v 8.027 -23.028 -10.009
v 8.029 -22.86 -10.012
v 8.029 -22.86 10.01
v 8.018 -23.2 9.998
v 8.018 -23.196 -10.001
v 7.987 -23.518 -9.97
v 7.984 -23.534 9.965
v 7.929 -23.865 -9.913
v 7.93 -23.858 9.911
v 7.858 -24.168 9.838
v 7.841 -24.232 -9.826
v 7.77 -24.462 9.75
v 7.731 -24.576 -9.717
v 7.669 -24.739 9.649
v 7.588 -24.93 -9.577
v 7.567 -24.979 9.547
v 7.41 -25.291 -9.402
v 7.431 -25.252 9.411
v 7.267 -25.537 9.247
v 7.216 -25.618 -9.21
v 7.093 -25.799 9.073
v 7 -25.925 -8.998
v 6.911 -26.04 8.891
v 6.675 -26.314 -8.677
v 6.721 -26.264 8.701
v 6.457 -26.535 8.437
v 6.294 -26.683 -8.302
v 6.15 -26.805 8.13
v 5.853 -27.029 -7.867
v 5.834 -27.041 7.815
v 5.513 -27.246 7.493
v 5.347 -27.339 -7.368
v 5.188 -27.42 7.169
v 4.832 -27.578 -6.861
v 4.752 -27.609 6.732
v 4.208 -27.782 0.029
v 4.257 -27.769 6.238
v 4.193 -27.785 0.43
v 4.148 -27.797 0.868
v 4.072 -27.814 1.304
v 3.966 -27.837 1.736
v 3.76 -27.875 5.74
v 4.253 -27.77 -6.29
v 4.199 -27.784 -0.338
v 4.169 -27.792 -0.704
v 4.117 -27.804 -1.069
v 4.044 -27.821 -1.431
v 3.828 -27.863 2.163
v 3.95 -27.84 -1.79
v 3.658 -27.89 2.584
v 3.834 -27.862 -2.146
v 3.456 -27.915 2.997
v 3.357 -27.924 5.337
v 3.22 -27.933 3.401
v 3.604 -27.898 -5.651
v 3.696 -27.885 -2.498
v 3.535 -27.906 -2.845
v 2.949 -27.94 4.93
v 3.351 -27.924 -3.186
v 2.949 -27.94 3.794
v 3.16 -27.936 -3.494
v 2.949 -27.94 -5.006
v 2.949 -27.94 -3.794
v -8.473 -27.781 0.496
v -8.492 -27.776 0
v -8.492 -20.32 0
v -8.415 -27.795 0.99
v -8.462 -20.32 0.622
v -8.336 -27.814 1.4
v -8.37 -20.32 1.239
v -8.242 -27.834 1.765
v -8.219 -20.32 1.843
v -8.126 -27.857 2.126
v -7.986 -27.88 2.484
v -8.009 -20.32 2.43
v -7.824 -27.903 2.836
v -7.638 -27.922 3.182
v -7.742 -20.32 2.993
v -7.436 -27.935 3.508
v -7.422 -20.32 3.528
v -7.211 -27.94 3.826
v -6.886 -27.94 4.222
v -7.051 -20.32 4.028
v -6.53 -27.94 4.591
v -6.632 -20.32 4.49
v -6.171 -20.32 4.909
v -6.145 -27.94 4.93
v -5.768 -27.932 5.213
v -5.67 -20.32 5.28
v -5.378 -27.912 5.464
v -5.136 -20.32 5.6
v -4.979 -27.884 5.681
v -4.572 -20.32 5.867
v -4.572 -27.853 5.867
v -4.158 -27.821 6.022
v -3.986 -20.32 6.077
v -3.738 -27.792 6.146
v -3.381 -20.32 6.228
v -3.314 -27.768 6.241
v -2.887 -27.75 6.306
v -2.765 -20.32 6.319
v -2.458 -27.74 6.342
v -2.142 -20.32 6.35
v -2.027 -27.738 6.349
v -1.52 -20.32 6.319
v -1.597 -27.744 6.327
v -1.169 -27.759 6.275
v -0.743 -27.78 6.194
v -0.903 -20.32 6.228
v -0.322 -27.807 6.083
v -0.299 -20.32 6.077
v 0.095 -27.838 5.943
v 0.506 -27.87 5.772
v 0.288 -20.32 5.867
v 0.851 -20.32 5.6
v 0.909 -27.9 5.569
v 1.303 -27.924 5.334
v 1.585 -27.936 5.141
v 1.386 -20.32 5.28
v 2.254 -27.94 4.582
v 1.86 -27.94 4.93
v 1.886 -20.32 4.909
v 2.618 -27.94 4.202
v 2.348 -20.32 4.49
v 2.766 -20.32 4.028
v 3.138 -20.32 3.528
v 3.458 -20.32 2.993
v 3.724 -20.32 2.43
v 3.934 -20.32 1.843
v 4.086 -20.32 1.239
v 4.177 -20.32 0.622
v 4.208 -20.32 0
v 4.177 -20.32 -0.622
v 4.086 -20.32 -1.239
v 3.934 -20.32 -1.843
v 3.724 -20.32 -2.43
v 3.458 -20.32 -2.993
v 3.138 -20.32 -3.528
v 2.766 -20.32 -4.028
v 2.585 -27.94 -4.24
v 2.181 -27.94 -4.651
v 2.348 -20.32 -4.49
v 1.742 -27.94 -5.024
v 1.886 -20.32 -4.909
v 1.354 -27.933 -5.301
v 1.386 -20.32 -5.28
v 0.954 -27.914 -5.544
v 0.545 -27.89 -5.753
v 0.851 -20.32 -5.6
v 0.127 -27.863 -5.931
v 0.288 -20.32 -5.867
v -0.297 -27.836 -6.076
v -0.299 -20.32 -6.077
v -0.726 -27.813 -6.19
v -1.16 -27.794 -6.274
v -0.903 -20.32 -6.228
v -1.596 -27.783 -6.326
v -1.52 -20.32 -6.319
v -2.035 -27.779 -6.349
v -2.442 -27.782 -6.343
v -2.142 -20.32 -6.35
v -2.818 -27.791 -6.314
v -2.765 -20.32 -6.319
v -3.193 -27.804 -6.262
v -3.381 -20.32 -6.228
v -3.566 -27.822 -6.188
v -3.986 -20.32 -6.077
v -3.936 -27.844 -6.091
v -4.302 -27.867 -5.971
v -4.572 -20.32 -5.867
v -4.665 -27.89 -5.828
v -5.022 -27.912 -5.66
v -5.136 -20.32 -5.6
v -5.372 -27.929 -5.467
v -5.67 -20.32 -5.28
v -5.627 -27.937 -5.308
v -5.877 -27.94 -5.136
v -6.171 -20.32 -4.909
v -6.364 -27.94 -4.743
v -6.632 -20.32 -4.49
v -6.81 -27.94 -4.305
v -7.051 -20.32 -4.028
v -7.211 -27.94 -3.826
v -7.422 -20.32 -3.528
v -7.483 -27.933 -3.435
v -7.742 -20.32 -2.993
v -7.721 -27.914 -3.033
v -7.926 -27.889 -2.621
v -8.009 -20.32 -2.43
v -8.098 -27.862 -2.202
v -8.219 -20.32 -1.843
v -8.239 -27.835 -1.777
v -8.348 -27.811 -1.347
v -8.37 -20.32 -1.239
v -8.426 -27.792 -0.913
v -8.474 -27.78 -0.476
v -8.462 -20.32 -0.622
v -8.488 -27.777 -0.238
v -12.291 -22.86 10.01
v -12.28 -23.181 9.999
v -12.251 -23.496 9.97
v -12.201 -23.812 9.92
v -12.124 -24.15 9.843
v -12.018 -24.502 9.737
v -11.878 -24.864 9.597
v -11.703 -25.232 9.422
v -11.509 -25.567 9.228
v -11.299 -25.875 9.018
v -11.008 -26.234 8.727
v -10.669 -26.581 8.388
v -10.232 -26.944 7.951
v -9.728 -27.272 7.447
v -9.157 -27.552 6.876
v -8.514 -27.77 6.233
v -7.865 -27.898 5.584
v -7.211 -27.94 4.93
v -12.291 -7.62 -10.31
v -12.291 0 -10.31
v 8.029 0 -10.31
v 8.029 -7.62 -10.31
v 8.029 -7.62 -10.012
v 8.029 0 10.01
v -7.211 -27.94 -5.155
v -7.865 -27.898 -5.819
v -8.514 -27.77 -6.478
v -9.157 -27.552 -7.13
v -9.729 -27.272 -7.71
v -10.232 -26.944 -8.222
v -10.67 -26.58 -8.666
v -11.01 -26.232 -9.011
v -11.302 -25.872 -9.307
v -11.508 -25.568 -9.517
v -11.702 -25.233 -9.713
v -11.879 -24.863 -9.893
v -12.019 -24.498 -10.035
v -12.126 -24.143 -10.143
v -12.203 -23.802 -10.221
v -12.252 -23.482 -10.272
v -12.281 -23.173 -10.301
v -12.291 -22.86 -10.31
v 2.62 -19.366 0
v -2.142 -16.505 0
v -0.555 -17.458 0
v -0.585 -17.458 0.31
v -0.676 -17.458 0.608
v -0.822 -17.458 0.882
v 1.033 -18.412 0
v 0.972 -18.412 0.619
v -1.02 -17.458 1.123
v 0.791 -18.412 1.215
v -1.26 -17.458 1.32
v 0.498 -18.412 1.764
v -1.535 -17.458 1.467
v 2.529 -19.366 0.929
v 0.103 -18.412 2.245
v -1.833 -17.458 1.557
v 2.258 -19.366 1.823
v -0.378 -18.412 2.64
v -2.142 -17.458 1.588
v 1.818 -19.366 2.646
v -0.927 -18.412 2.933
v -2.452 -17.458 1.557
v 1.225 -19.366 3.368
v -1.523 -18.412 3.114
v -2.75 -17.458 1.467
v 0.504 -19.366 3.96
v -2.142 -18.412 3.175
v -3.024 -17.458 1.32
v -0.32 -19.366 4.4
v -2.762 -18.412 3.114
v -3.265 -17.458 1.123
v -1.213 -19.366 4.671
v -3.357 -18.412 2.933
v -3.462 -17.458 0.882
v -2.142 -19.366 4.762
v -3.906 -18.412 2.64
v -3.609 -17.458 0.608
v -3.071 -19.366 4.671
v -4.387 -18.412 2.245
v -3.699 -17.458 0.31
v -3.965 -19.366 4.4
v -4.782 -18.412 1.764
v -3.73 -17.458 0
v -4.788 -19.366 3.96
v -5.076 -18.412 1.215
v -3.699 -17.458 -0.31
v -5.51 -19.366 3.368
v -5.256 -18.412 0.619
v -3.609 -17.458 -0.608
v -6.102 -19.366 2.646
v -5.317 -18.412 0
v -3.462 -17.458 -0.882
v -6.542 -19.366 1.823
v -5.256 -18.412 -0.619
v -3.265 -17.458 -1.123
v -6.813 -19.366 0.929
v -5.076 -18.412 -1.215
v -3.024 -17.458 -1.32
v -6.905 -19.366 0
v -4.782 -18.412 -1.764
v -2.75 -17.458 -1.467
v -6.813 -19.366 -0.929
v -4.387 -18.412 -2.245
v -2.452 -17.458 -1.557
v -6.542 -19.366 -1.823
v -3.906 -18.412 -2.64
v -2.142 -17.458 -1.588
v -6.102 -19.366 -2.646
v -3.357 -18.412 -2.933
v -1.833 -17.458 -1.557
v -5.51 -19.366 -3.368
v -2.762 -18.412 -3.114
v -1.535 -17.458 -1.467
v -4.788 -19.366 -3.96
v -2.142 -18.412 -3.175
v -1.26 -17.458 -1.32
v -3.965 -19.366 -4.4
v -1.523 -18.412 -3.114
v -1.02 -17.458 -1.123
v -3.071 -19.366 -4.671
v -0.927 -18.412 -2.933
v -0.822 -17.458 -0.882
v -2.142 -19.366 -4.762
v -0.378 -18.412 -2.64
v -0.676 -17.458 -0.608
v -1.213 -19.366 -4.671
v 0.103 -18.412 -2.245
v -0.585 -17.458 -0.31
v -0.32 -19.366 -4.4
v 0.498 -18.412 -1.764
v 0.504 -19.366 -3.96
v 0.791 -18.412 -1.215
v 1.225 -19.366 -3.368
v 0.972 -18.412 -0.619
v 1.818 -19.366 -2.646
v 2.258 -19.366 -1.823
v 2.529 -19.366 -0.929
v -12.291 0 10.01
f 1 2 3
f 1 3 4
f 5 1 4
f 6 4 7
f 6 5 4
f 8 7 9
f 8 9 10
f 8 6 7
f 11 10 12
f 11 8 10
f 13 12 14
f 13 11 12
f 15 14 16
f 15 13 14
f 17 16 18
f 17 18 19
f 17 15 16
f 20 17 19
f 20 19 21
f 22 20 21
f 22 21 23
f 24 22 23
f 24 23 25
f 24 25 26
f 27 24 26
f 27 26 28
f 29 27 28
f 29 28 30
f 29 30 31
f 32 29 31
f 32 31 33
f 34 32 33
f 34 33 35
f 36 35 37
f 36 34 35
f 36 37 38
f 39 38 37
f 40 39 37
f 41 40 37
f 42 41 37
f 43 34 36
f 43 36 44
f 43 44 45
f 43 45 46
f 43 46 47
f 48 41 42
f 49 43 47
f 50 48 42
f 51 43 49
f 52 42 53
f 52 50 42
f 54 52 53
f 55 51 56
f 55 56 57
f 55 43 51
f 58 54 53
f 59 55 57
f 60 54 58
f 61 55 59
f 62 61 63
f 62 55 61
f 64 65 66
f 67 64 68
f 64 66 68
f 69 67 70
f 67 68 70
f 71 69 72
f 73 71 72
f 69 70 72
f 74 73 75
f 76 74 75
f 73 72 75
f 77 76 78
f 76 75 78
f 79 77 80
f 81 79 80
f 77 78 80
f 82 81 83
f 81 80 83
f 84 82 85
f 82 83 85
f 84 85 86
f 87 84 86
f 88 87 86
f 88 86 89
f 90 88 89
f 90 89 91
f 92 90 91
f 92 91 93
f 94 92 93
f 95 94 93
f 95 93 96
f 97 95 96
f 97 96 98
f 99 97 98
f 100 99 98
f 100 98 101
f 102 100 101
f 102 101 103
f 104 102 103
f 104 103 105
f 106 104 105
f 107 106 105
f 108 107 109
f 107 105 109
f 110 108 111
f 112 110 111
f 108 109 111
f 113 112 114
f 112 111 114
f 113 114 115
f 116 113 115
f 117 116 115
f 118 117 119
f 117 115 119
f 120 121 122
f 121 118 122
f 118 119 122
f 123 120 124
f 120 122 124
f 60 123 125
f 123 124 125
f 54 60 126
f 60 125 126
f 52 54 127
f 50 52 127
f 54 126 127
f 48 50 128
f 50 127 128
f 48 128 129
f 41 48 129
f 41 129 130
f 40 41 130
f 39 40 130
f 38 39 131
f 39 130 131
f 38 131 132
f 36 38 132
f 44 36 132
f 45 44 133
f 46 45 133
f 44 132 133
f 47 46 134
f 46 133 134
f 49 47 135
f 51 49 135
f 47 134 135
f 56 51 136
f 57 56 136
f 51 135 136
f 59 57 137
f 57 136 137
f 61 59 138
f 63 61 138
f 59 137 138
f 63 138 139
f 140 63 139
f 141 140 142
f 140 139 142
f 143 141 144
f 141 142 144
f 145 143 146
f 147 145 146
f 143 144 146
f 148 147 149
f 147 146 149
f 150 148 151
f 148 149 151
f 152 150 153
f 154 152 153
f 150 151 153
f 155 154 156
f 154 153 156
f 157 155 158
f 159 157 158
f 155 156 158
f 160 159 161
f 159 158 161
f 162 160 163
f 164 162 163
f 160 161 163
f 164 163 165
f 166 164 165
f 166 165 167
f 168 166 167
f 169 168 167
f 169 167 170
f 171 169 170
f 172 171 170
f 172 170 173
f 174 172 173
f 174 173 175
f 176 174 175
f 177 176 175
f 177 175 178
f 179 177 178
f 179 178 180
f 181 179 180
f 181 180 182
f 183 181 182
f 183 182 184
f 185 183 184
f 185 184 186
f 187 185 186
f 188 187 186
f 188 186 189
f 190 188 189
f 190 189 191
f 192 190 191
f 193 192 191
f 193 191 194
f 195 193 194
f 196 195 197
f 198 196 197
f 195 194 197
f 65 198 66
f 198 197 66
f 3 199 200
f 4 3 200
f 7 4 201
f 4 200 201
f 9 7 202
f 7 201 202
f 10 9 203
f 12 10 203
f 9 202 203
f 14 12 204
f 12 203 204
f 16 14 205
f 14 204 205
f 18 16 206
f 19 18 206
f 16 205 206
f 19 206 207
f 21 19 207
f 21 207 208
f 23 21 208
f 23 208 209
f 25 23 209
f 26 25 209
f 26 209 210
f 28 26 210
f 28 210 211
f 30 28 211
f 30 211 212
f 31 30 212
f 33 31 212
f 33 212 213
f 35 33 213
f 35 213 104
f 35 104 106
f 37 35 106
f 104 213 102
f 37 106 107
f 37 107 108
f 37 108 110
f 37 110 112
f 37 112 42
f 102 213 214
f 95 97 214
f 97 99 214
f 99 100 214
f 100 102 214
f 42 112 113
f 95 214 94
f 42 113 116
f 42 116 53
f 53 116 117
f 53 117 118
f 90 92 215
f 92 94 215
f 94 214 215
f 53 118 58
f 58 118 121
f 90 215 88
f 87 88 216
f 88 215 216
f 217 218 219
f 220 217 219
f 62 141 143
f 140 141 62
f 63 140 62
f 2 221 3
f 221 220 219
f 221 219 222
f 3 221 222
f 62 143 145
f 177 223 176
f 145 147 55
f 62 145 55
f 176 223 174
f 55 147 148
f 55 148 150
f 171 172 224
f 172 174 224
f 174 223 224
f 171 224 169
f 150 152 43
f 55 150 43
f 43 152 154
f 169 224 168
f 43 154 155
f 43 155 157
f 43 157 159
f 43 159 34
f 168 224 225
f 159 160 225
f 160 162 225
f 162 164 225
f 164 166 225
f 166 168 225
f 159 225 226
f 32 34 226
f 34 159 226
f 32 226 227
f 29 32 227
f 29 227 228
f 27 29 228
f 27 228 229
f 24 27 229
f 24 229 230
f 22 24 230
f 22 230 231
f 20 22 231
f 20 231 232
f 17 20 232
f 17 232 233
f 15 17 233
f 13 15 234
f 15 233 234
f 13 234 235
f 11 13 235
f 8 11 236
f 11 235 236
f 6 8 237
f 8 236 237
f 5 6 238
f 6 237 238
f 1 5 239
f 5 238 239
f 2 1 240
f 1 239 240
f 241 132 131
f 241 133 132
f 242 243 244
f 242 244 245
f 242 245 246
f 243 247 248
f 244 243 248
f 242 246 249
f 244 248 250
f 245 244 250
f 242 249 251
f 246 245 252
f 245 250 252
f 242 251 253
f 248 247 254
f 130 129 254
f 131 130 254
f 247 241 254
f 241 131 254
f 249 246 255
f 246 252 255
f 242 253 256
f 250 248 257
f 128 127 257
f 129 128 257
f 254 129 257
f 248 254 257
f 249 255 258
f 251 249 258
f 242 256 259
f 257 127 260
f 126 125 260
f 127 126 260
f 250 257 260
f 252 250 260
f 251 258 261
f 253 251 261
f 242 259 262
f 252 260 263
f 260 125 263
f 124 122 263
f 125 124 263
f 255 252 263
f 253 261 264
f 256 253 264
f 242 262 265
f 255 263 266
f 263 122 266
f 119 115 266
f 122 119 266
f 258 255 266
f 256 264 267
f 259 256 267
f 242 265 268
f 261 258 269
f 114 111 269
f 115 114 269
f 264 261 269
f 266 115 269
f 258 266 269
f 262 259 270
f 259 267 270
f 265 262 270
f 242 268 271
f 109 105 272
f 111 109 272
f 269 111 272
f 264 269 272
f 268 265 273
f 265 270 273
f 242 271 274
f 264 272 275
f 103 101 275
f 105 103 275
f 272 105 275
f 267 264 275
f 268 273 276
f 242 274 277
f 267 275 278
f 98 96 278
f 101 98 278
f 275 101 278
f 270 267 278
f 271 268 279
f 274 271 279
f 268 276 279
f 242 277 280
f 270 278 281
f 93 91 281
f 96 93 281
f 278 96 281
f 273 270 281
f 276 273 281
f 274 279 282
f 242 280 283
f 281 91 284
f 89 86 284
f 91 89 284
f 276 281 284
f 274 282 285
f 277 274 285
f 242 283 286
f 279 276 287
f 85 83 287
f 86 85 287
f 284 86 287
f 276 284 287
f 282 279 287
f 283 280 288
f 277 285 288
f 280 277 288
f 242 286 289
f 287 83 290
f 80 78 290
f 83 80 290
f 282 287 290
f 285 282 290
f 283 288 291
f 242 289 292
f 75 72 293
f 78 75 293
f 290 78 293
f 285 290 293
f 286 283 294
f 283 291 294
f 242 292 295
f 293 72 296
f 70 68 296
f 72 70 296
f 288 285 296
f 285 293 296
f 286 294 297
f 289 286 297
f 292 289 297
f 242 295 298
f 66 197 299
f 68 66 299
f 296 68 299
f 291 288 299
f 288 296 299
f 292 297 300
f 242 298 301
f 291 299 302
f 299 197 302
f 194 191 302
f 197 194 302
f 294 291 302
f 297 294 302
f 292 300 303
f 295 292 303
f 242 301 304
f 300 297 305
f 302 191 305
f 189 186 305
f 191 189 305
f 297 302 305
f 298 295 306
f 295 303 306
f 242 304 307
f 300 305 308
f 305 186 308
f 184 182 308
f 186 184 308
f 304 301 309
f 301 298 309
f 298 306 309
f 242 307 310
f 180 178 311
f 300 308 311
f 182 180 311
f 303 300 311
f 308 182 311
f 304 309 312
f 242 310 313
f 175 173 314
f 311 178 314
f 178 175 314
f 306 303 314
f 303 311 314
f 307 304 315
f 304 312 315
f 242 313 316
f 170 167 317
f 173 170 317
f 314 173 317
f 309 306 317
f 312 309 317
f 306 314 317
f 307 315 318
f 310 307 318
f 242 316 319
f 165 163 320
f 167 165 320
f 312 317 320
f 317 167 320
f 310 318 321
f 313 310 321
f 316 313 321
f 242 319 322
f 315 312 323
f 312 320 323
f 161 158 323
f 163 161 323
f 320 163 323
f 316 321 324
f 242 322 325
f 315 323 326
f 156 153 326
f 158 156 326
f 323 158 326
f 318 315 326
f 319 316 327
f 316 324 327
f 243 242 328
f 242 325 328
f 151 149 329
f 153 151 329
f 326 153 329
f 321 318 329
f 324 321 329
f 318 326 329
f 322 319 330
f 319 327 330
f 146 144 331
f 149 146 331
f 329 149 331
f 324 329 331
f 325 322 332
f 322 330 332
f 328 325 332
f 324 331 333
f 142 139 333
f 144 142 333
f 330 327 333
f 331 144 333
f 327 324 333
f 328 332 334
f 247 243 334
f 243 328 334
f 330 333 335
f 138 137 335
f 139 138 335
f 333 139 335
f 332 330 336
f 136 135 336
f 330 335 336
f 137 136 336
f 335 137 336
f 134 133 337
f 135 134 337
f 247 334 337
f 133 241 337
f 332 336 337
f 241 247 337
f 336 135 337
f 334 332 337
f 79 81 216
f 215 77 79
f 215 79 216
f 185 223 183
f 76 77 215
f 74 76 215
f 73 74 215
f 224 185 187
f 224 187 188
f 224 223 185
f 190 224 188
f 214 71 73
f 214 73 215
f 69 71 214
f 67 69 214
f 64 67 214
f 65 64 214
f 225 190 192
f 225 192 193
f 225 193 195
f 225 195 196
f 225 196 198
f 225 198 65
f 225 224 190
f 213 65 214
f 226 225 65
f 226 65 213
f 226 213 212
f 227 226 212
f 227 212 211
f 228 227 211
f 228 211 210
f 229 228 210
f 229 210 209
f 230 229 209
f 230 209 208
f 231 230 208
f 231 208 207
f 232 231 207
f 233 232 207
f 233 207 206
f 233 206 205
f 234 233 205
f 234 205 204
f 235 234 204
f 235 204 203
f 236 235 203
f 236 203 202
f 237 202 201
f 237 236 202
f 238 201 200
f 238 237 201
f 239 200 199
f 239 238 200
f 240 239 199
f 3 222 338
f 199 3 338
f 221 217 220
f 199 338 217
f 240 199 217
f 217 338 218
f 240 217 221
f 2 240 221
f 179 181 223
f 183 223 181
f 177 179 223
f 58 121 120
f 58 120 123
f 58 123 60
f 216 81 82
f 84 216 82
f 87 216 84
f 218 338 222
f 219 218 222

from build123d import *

# Parameters (mm, degrees)
F0_W        = 20.32
F0_H        = 20.32
F1_DEPTH    = 7.62
F3_DEPTH    = 20.32
F5_D        = 12.7
F5_DEPTH    = 7.62
F5_TIP      = 3.8154649308
F6_T1_DEPTH = 45.72
F6_T3_DEPTH = 45.4214045093
F6_T5_DEPTH = 45.72
F6_T7_DEPTH = 45.7221937612


# Not quite as in the source:
# - a fillet or chamfer that OpenCascade refuses, or shapes differently, is made with other operations: its cross-section is extruded or revolved along the edge and cut away or added


with BuildPart() as f1:
    # F0 (on Front) → F1 (new body)
    with BuildSketch(Plane.XZ):
        with Locations((-2.1305914207, -0.150394626)):
            Rectangle(F0_W, F0_H)
    extrude(amount=F1_DEPTH)

    # F2 (on face) → F3 (join)
    with BuildSketch(Plane.XZ.offset(7.62)):
        Polygon((-12.2905914207, 10.009605374), (-12.2905914207, -10.310394626), (8.0294085793, -10.0117991352), (8.0294085793, 10.009605374), align=None)
    extrude(amount=F3_DEPTH)

    # F5
    with Locations(Plane.XZ.offset(27.94)):
        with Locations((-2.1422964055, 0)):
            Hole(F5_D / 2, depth=F5_DEPTH)
            with Locations((0, 0, -(F5_DEPTH + F5_TIP / 2))):  # 118° drill point
                Cone(0, F5_D / 2, F5_TIP, mode=Mode.SUBTRACT)

    # F6: fillet of radius 5.08 on 4 edges, made by hand

    # F6_s2 → F6_t1 (cut)
    with BuildSketch(Plane.YZ.offset(-24.9905914207)):
        with BuildLine():
            ThreePointArc((-22.86, 10.009605374), (-26.4521024484, 8.5217078225), (-27.94, 4.929605374))
            Line((-27.94, 4.929605374), (-27.94, 10.009605374))
            Line((-27.94, 10.009605374), (-22.86, 10.009605374))
        make_face()
    extrude(amount=F6_T1_DEPTH, mode=Mode.SUBTRACT)

    # F6_s4 → F6_t3 (cut)
    with BuildSketch(Plane.XY.offset(-22.7117991352)):
        with BuildLine():
            ThreePointArc((8.0294085793, -22.86), (6.5415110277, -26.4521024484), (2.9494085793, -27.94))
            Line((2.9494085793, -27.94), (8.0294085793, -27.94))
            Line((8.0294085793, -27.94), (8.0294085793, -22.86))
        make_face()
    extrude(amount=F6_T3_DEPTH, mode=Mode.SUBTRACT)

    # F6_s6 → F6_t5 (cut)
    with BuildSketch(Plane.XY.offset(-23.010394626)):
        with BuildLine():
            ThreePointArc((-7.2105914207, -27.94), (-10.8026938691, -26.4521024484), (-12.2905914207, -22.86))
            Line((-12.2905914207, -22.86), (-12.2905914207, -27.94))
            Line((-12.2905914207, -27.94), (-7.2105914207, -27.94))
        make_face()
    extrude(amount=F6_T5_DEPTH, mode=Mode.SUBTRACT)

    # F6_s8 → F6_t7 (cut)
    with BuildSketch(Plane(origin=(-25.138042131, 0, -0.3693949816), x_dir=(0, 1, 0), z_dir=(0.999892051, 0, 0.0146930737))):
        with BuildLine():
            ThreePointArc((-27.94, -5.0486950632), (-26.4521024484, -8.6407975117), (-22.86, -10.1286950632))
            Line((-22.86, -10.1286950632), (-27.94, -10.1286950632))
            Line((-27.94, -10.1286950632), (-27.94, -5.0486950632))
        make_face()
    extrude(amount=F6_T7_DEPTH, mode=Mode.SUBTRACT)


solid = f1.part
